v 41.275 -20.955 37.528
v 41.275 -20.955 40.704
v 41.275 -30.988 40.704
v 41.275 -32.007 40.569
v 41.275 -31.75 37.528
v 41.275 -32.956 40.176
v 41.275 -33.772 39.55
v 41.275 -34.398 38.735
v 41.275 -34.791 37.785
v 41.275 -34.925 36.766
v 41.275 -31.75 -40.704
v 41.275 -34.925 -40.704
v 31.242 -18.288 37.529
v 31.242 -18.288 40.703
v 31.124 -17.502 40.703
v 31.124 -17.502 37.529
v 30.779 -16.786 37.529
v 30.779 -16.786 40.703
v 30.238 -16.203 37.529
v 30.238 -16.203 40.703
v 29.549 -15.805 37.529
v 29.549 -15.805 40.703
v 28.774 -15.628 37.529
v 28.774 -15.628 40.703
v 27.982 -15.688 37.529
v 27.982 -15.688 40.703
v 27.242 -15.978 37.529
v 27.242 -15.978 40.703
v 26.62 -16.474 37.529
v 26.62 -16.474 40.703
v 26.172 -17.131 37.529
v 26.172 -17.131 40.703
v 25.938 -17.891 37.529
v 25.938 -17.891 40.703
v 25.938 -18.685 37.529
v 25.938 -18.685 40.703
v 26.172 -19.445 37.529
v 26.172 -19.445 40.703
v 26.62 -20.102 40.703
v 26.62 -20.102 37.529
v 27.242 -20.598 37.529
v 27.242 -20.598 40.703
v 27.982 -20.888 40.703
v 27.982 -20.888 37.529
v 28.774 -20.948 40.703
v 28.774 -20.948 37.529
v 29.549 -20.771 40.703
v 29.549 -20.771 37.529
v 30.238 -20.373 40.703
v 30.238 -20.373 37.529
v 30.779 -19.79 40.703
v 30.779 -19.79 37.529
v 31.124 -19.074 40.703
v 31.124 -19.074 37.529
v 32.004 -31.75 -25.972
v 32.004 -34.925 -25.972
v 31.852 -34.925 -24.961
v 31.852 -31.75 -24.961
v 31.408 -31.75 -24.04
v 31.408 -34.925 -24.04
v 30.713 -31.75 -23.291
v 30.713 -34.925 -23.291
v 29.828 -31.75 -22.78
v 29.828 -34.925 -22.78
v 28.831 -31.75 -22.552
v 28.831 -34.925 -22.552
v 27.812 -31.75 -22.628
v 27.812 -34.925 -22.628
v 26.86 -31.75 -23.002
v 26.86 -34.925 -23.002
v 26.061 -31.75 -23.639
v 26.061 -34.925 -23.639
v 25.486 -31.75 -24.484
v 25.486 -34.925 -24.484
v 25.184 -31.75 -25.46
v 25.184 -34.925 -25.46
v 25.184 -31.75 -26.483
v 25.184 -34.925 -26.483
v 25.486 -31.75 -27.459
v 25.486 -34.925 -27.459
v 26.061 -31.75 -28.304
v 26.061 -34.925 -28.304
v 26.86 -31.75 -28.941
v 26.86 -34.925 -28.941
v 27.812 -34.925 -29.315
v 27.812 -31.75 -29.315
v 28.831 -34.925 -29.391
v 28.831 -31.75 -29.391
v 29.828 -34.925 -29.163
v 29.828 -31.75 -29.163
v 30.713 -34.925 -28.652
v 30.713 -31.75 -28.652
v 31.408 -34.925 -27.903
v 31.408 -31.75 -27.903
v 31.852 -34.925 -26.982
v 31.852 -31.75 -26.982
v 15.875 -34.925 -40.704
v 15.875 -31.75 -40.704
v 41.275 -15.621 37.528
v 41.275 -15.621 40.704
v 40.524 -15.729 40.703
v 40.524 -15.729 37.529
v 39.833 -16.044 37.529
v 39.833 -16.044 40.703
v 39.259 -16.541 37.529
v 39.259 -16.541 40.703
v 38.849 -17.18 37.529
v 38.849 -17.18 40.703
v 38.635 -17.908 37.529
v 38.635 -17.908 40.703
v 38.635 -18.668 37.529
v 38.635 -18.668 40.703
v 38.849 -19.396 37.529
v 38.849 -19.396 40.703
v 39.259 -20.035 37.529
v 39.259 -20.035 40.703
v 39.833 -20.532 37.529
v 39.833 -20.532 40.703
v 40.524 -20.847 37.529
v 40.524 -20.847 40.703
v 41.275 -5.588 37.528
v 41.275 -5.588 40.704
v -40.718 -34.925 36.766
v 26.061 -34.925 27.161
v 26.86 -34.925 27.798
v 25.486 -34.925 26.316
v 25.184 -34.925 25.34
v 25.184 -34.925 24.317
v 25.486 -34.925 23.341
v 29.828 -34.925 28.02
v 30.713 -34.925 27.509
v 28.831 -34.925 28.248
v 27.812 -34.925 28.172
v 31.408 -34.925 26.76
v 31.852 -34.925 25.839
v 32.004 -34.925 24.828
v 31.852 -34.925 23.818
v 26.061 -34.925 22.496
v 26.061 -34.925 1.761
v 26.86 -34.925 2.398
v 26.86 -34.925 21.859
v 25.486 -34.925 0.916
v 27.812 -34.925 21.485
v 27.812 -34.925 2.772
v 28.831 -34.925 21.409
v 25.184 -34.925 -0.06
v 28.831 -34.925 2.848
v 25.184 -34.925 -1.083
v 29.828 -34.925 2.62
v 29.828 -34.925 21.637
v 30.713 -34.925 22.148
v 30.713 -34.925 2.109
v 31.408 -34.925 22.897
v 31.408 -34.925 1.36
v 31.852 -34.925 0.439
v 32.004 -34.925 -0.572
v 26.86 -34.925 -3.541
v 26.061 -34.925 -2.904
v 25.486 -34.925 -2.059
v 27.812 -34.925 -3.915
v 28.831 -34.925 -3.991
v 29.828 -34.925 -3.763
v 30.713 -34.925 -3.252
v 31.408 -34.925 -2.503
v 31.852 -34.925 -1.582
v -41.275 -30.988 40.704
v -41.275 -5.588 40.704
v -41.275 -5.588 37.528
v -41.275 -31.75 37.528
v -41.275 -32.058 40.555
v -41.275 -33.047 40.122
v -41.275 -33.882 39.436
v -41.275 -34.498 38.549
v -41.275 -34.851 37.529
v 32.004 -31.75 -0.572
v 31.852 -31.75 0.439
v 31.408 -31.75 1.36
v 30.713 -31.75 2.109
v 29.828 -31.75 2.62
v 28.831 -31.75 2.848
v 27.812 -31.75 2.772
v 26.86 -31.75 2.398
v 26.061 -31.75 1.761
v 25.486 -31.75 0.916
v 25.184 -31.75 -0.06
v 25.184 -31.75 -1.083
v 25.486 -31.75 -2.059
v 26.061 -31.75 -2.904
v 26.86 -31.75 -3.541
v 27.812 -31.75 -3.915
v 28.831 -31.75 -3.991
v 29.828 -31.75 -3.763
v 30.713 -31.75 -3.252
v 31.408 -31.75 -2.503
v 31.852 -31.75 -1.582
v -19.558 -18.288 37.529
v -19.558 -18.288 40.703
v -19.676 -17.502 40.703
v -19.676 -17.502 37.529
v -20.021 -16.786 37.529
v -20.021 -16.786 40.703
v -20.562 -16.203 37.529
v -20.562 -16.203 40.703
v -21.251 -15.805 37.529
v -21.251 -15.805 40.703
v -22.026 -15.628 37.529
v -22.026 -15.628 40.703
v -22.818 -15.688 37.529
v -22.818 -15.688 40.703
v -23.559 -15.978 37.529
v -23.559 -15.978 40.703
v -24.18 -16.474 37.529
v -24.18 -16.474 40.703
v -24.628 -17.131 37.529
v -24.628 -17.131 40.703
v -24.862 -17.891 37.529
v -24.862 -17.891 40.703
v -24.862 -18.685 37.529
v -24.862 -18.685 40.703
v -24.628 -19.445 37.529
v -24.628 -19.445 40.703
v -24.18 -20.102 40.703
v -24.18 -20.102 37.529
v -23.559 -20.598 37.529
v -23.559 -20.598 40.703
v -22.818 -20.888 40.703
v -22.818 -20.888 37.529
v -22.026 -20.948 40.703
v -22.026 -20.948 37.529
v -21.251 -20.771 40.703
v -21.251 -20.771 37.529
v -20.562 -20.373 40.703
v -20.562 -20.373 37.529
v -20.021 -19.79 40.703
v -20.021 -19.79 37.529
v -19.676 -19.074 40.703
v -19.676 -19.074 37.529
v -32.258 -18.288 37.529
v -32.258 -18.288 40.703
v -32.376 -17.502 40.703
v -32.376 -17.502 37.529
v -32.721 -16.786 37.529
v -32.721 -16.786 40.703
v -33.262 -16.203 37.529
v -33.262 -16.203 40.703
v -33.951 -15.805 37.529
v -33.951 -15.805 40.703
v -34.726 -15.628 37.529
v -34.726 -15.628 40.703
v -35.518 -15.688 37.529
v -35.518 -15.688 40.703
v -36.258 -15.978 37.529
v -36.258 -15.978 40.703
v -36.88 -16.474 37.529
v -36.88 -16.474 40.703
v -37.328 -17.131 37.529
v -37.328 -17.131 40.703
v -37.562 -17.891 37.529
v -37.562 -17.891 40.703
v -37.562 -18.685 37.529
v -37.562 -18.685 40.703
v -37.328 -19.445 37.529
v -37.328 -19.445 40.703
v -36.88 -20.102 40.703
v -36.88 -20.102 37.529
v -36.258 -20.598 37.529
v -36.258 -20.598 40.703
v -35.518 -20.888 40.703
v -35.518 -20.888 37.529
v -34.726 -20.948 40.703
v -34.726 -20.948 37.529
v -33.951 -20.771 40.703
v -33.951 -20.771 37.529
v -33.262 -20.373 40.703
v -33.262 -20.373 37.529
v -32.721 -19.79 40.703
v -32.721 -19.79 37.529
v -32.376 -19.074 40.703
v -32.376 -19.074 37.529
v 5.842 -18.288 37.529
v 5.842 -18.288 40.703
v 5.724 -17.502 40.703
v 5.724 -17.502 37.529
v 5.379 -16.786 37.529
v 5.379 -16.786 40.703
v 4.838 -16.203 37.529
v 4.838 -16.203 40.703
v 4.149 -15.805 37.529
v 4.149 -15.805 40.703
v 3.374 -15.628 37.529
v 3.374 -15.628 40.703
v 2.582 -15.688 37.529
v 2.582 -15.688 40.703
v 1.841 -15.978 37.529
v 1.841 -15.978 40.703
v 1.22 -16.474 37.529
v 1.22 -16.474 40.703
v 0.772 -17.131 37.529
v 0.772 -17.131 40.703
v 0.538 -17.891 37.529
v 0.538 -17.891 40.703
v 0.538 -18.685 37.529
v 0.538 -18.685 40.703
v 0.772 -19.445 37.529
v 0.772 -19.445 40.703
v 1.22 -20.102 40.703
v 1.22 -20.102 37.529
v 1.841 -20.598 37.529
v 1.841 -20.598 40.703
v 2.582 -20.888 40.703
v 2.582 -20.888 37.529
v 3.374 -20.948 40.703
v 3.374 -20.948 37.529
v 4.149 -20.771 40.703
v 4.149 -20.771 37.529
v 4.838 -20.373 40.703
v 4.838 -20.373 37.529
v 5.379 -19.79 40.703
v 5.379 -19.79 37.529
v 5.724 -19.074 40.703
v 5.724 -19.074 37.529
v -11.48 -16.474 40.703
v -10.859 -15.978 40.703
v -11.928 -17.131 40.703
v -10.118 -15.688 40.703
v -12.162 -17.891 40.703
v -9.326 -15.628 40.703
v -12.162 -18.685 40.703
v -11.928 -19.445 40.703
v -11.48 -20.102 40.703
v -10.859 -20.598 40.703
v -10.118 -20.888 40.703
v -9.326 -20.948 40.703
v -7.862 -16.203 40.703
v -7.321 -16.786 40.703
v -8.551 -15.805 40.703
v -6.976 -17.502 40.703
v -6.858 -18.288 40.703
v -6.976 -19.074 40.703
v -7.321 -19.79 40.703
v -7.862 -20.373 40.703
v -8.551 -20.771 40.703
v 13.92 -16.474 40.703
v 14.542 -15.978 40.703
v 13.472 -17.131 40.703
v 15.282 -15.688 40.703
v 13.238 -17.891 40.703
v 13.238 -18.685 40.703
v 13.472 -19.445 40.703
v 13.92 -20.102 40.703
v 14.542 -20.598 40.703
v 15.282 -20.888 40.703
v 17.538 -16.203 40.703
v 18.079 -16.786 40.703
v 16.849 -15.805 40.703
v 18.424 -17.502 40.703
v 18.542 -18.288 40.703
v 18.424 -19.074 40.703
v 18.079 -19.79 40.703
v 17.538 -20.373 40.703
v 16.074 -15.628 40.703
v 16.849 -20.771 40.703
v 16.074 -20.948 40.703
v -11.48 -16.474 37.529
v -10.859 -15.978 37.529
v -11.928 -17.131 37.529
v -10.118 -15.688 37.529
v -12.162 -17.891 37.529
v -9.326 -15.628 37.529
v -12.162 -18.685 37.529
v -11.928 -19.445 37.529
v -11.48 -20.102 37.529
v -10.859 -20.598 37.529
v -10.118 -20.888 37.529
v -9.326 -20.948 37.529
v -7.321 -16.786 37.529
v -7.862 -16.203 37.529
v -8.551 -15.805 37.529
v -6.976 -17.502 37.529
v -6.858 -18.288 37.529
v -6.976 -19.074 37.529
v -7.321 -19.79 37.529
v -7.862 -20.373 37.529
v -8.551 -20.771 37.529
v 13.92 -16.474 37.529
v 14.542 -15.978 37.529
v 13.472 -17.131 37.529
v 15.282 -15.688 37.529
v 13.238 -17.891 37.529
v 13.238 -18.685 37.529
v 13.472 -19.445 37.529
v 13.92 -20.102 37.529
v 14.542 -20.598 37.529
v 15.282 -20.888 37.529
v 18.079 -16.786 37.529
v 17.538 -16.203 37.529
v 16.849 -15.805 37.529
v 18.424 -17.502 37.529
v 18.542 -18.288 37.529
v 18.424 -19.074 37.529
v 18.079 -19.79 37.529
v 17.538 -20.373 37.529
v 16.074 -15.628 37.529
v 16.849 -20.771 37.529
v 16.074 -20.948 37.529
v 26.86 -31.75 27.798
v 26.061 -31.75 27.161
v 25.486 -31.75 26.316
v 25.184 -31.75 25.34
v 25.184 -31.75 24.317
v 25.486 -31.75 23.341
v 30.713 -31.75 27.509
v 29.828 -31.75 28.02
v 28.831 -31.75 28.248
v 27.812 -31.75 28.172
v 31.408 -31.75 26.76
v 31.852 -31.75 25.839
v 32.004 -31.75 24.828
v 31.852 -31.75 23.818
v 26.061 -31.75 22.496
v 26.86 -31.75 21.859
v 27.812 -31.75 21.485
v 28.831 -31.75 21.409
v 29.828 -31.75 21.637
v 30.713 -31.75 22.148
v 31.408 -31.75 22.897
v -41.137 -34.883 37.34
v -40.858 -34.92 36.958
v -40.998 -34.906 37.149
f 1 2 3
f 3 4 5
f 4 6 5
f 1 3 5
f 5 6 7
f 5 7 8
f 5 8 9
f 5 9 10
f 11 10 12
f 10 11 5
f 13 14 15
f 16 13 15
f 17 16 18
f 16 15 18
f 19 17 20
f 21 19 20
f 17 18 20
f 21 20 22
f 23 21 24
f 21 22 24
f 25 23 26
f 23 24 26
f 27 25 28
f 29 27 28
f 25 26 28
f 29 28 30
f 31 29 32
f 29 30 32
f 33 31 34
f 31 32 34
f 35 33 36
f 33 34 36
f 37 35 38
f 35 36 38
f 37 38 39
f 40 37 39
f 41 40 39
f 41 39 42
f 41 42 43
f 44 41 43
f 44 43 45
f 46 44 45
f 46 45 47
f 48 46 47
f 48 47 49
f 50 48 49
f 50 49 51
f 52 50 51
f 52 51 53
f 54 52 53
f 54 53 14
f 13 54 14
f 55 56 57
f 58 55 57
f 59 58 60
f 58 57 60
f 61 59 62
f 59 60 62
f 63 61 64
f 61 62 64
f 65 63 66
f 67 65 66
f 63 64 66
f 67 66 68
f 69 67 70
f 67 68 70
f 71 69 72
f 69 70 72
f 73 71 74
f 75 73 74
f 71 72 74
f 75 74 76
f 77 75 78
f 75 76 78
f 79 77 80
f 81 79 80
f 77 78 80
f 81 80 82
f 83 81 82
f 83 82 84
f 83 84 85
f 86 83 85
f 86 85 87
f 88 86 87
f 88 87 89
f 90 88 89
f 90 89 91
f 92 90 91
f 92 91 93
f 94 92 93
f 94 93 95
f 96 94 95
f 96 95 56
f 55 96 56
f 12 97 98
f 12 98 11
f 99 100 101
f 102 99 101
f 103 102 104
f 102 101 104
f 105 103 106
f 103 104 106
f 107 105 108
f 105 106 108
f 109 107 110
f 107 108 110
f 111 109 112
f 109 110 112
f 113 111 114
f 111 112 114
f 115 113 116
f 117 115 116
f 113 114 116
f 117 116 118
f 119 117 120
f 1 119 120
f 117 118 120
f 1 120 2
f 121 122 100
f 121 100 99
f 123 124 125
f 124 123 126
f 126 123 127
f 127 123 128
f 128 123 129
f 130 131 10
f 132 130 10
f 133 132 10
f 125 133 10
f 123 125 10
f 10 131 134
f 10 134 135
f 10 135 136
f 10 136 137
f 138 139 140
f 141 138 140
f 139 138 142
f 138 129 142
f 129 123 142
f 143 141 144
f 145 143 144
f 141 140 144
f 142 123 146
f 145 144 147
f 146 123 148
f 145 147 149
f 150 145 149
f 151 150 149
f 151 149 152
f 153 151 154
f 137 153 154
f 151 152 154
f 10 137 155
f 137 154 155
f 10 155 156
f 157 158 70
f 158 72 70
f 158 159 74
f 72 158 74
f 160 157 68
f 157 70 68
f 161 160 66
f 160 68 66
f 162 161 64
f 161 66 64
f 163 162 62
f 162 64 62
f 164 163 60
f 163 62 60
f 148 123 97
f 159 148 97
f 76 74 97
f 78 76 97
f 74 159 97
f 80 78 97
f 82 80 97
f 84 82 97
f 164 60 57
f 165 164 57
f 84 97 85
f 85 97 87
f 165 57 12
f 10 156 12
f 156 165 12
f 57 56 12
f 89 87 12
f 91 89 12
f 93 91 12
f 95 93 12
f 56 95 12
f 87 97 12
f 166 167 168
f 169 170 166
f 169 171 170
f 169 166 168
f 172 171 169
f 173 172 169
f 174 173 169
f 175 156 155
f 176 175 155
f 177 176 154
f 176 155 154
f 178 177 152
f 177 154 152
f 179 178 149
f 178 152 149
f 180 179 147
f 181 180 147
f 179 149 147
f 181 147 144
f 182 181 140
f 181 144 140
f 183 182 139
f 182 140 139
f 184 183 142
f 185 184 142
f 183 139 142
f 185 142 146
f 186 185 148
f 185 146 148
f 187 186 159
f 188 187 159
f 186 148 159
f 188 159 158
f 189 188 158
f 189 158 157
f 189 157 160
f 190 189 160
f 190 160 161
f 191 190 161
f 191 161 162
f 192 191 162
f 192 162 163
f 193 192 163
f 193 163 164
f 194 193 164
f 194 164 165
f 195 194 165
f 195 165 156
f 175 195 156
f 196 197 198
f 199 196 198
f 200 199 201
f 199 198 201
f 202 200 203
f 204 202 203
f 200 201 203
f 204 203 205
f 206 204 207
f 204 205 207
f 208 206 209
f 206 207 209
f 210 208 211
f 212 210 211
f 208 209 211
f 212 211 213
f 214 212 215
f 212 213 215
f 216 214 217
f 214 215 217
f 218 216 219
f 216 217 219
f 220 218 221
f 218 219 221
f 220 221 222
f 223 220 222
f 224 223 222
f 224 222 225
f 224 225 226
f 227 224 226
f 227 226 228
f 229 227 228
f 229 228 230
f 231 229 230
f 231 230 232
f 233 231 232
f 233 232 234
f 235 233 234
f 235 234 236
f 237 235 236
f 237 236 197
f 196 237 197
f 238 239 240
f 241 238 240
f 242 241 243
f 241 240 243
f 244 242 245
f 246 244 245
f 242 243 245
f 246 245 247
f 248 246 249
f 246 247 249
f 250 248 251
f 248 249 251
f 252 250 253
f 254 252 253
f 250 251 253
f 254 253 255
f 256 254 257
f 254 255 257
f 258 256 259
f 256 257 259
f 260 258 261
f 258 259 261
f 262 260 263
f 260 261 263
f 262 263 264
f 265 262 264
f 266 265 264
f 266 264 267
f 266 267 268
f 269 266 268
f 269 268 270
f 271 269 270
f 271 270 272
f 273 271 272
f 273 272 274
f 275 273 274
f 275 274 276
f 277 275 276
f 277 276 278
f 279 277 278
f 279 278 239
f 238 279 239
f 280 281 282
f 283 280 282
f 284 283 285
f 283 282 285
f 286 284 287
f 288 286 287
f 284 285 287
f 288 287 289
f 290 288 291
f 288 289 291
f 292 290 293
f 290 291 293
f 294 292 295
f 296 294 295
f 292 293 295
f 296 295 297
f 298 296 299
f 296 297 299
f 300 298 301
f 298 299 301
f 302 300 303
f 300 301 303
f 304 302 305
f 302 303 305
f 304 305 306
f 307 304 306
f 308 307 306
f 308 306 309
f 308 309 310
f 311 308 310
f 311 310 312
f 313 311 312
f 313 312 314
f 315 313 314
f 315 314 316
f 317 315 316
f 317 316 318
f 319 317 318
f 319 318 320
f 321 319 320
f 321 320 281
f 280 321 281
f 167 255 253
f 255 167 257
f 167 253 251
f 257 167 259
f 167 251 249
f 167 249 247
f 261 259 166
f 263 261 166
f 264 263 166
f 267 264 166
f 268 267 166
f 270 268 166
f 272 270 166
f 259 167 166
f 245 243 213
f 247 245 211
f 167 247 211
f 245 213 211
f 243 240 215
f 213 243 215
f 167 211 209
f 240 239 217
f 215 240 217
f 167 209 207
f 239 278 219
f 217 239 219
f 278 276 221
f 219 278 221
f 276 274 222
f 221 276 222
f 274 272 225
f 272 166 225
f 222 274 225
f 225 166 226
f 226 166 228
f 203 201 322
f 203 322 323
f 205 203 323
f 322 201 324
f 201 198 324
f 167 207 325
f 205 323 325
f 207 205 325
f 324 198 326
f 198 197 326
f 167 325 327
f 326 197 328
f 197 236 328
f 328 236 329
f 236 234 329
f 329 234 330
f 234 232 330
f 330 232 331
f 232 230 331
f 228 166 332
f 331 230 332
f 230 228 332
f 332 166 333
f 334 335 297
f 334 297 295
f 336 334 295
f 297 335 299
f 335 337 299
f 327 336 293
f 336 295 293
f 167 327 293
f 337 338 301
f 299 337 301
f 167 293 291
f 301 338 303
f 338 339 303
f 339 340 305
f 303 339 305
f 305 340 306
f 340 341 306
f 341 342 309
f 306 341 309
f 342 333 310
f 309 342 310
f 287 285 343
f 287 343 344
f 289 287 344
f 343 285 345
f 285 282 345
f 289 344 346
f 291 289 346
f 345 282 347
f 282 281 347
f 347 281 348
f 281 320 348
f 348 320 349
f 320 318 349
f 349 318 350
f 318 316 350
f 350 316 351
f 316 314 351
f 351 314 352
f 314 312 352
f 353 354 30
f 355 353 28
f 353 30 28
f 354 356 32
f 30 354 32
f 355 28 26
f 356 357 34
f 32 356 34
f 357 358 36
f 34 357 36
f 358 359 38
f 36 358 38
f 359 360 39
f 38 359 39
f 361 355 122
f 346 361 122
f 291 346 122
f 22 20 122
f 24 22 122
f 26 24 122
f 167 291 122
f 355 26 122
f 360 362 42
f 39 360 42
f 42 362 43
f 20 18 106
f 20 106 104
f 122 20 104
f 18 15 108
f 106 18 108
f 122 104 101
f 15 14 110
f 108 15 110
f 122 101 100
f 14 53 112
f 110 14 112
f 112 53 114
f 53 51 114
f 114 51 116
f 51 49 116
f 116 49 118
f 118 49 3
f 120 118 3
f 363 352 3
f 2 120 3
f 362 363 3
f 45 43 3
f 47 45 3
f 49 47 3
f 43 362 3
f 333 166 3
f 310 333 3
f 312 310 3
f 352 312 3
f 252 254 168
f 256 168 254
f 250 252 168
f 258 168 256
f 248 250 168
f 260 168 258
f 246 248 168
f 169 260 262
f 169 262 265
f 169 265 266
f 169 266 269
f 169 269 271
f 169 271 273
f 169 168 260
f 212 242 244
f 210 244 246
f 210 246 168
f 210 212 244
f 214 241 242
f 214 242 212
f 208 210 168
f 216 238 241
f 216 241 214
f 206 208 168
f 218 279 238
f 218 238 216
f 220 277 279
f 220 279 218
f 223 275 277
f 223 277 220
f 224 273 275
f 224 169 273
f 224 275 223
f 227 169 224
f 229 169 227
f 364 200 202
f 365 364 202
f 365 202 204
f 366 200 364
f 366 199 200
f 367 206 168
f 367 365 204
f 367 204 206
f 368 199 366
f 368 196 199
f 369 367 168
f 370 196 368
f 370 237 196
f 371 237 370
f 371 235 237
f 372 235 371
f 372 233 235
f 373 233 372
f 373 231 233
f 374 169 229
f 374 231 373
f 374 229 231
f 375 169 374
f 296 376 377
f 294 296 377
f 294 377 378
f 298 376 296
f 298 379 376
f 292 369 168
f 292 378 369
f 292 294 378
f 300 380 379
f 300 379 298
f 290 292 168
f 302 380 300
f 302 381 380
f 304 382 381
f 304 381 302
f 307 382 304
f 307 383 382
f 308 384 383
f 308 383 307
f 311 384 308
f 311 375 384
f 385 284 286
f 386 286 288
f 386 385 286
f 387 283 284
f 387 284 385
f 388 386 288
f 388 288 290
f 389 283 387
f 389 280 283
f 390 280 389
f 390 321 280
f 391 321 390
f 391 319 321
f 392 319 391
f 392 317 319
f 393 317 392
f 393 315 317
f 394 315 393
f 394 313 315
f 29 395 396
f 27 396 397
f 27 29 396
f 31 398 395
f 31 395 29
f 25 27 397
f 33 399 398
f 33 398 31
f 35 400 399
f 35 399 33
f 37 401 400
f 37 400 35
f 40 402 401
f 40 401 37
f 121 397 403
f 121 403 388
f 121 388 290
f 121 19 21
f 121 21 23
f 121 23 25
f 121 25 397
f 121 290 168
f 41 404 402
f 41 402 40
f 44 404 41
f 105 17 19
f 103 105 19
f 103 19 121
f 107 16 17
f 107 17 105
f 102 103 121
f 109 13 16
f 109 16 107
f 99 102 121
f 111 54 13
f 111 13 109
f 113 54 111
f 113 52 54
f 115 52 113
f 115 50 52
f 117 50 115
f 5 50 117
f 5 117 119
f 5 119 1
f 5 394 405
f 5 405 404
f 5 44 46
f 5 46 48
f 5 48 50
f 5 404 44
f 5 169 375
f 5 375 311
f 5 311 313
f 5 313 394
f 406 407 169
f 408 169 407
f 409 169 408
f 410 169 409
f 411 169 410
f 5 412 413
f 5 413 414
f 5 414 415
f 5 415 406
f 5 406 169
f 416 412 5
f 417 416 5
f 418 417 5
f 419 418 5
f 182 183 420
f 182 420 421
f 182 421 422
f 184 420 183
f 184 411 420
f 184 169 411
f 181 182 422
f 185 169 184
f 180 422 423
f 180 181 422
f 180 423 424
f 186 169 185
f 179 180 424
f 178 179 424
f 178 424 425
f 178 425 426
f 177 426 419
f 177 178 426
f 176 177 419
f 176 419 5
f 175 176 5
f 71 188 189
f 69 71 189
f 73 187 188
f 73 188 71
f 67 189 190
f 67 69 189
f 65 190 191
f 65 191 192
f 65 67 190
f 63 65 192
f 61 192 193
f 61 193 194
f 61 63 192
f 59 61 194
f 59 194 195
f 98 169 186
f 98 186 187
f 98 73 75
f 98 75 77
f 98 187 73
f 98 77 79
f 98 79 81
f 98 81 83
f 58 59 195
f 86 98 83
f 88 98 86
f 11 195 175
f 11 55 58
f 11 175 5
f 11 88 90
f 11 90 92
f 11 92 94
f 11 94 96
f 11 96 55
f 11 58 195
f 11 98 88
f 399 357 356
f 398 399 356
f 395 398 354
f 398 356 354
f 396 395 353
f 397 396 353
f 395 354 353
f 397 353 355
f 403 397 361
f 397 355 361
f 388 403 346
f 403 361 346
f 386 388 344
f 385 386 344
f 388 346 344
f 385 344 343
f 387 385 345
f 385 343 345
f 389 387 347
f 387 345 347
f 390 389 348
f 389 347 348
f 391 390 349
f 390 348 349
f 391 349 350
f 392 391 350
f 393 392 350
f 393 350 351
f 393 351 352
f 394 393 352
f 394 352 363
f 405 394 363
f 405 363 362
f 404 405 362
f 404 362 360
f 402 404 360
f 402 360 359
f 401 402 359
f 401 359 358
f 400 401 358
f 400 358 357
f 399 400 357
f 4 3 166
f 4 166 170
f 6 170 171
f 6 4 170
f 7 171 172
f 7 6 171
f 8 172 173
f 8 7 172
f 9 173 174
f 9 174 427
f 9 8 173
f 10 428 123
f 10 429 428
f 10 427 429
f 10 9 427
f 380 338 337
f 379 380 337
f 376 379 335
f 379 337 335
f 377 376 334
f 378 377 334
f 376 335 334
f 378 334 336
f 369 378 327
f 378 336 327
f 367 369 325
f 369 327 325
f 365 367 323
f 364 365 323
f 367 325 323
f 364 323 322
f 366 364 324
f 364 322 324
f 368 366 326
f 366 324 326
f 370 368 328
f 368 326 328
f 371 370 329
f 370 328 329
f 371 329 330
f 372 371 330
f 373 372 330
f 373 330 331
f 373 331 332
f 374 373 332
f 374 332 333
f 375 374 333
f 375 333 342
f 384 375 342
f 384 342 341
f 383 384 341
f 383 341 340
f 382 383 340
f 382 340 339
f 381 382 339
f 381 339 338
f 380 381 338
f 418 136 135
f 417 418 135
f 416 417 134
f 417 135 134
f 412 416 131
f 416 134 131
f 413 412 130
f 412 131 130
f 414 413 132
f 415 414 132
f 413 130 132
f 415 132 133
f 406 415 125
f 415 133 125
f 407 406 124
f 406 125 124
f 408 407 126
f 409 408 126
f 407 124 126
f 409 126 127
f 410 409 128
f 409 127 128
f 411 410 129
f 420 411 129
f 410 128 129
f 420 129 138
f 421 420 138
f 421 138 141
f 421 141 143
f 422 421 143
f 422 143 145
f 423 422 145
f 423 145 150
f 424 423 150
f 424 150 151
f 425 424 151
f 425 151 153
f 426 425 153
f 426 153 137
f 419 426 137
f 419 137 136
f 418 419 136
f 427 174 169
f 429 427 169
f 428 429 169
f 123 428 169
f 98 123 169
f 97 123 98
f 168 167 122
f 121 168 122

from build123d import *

# Parameters (mm, degrees)
BOSS_EXTRUDE1_START    = -34.925
SKETCH1_W              = 82.55
SKETCH1_H              = 81.407
BOSS_EXTRUDE1_DEPTH    = 3.175
SKETCH3_W              = 82.55
SKETCH3_H              = 3.175
BOSS_EXTRUDE2_DEPTH    = 50.8
F_10_CLEARANCE_HOLE2_D = 5.334
CHAMFER1_SIZE          = 3.175
FILLET2_R              = 3.937
SKETCH9_R              = 3.429
CUT_EXTRUDE2_DEPTH     = 54.975
SKETCH10_W             = 82.55
SKETCH10_H             = 24.638
CUT_EXTRUDE3_DEPTH     = 82.407


with BuildPart() as part:
    # Sketch1 → Boss-Extrude1 (new body)
    with BuildSketch(Plane(origin=(0, 0, 0), x_dir=(1, 0, 0), z_dir=(0, 1, 0)).offset(BOSS_EXTRUDE1_START)):
        Rectangle(SKETCH1_W, SKETCH1_H)
    extrude(amount=BOSS_EXTRUDE1_DEPTH)

    # Sketch3 → Boss-Extrude2 (add)
    with BuildSketch(Plane(origin=(0, -31.75, 0), x_dir=(1, 0, 0), z_dir=(0, 1, 0))):
        with Locations((0, -39.116)):
            Rectangle(SKETCH3_W, SKETCH3_H)
    extrude(amount=BOSS_EXTRUDE2_DEPTH)

    # #10 Clearance Hole2 (through all)
    with Locations(Plane(origin=(0, 0, -40.7035), x_dir=(-1, 0, 0), z_dir=(0, 0, -1))):
        with Locations((22.225, 7.112), (9.525, 7.112), (-3.175, 7.112), (-15.875, 7.112), (-28.575, 7.112), (22.225, -18.288), (9.525, -18.288), (-3.175, -18.288), (-15.875, -18.288), (-28.575, -18.288), (34.925, 7.112), (34.925, -18.288), (-41.275, 7.112), (-41.275, -18.288)):
            Hole(F_10_CLEARANCE_HOLE2_D / 2)

    # Chamfer1
    chamfer1_edges = [part.edges().sort_by_distance(p)[0] for p in [
        (-41.275, 19.05, 39.116),
    ]]
    chamfer(chamfer1_edges, length=CHAMFER1_SIZE)

    # Fillet2
    fillet2_edges = [part.edges().sort_by_distance(p)[0] for p in [
        (0, -34.925, 40.7035),
    ]]
    fillet(fillet2_edges, radius=FILLET2_R)

    # Sketch9 → Cut-Extrude2 (cut, through all)
    with BuildSketch(Plane.XZ.offset(34.925)):
        with Locations((28.575, 24.8285)):
            Circle(SKETCH9_R)
        with Locations((28.575, -0.5715)):
            Circle(SKETCH9_R)
        with Locations((28.575, -25.9715)):
            Circle(SKETCH9_R)
        Polygon((-41.275, 37.5285), (15.875, -40.7035), (-41.275, -40.7035), align=None)
    extrude(amount=-CUT_EXTRUDE2_DEPTH, mode=Mode.SUBTRACT)

    # Sketch10 → Cut-Extrude3 (cut, through all)
    with BuildSketch(Plane.XY.offset(40.7035)):
        with Locations((0, 6.731)):
            Rectangle(SKETCH10_W, SKETCH10_H)
    extrude(amount=-CUT_EXTRUDE3_DEPTH, mode=Mode.SUBTRACT)


solid = part.part
